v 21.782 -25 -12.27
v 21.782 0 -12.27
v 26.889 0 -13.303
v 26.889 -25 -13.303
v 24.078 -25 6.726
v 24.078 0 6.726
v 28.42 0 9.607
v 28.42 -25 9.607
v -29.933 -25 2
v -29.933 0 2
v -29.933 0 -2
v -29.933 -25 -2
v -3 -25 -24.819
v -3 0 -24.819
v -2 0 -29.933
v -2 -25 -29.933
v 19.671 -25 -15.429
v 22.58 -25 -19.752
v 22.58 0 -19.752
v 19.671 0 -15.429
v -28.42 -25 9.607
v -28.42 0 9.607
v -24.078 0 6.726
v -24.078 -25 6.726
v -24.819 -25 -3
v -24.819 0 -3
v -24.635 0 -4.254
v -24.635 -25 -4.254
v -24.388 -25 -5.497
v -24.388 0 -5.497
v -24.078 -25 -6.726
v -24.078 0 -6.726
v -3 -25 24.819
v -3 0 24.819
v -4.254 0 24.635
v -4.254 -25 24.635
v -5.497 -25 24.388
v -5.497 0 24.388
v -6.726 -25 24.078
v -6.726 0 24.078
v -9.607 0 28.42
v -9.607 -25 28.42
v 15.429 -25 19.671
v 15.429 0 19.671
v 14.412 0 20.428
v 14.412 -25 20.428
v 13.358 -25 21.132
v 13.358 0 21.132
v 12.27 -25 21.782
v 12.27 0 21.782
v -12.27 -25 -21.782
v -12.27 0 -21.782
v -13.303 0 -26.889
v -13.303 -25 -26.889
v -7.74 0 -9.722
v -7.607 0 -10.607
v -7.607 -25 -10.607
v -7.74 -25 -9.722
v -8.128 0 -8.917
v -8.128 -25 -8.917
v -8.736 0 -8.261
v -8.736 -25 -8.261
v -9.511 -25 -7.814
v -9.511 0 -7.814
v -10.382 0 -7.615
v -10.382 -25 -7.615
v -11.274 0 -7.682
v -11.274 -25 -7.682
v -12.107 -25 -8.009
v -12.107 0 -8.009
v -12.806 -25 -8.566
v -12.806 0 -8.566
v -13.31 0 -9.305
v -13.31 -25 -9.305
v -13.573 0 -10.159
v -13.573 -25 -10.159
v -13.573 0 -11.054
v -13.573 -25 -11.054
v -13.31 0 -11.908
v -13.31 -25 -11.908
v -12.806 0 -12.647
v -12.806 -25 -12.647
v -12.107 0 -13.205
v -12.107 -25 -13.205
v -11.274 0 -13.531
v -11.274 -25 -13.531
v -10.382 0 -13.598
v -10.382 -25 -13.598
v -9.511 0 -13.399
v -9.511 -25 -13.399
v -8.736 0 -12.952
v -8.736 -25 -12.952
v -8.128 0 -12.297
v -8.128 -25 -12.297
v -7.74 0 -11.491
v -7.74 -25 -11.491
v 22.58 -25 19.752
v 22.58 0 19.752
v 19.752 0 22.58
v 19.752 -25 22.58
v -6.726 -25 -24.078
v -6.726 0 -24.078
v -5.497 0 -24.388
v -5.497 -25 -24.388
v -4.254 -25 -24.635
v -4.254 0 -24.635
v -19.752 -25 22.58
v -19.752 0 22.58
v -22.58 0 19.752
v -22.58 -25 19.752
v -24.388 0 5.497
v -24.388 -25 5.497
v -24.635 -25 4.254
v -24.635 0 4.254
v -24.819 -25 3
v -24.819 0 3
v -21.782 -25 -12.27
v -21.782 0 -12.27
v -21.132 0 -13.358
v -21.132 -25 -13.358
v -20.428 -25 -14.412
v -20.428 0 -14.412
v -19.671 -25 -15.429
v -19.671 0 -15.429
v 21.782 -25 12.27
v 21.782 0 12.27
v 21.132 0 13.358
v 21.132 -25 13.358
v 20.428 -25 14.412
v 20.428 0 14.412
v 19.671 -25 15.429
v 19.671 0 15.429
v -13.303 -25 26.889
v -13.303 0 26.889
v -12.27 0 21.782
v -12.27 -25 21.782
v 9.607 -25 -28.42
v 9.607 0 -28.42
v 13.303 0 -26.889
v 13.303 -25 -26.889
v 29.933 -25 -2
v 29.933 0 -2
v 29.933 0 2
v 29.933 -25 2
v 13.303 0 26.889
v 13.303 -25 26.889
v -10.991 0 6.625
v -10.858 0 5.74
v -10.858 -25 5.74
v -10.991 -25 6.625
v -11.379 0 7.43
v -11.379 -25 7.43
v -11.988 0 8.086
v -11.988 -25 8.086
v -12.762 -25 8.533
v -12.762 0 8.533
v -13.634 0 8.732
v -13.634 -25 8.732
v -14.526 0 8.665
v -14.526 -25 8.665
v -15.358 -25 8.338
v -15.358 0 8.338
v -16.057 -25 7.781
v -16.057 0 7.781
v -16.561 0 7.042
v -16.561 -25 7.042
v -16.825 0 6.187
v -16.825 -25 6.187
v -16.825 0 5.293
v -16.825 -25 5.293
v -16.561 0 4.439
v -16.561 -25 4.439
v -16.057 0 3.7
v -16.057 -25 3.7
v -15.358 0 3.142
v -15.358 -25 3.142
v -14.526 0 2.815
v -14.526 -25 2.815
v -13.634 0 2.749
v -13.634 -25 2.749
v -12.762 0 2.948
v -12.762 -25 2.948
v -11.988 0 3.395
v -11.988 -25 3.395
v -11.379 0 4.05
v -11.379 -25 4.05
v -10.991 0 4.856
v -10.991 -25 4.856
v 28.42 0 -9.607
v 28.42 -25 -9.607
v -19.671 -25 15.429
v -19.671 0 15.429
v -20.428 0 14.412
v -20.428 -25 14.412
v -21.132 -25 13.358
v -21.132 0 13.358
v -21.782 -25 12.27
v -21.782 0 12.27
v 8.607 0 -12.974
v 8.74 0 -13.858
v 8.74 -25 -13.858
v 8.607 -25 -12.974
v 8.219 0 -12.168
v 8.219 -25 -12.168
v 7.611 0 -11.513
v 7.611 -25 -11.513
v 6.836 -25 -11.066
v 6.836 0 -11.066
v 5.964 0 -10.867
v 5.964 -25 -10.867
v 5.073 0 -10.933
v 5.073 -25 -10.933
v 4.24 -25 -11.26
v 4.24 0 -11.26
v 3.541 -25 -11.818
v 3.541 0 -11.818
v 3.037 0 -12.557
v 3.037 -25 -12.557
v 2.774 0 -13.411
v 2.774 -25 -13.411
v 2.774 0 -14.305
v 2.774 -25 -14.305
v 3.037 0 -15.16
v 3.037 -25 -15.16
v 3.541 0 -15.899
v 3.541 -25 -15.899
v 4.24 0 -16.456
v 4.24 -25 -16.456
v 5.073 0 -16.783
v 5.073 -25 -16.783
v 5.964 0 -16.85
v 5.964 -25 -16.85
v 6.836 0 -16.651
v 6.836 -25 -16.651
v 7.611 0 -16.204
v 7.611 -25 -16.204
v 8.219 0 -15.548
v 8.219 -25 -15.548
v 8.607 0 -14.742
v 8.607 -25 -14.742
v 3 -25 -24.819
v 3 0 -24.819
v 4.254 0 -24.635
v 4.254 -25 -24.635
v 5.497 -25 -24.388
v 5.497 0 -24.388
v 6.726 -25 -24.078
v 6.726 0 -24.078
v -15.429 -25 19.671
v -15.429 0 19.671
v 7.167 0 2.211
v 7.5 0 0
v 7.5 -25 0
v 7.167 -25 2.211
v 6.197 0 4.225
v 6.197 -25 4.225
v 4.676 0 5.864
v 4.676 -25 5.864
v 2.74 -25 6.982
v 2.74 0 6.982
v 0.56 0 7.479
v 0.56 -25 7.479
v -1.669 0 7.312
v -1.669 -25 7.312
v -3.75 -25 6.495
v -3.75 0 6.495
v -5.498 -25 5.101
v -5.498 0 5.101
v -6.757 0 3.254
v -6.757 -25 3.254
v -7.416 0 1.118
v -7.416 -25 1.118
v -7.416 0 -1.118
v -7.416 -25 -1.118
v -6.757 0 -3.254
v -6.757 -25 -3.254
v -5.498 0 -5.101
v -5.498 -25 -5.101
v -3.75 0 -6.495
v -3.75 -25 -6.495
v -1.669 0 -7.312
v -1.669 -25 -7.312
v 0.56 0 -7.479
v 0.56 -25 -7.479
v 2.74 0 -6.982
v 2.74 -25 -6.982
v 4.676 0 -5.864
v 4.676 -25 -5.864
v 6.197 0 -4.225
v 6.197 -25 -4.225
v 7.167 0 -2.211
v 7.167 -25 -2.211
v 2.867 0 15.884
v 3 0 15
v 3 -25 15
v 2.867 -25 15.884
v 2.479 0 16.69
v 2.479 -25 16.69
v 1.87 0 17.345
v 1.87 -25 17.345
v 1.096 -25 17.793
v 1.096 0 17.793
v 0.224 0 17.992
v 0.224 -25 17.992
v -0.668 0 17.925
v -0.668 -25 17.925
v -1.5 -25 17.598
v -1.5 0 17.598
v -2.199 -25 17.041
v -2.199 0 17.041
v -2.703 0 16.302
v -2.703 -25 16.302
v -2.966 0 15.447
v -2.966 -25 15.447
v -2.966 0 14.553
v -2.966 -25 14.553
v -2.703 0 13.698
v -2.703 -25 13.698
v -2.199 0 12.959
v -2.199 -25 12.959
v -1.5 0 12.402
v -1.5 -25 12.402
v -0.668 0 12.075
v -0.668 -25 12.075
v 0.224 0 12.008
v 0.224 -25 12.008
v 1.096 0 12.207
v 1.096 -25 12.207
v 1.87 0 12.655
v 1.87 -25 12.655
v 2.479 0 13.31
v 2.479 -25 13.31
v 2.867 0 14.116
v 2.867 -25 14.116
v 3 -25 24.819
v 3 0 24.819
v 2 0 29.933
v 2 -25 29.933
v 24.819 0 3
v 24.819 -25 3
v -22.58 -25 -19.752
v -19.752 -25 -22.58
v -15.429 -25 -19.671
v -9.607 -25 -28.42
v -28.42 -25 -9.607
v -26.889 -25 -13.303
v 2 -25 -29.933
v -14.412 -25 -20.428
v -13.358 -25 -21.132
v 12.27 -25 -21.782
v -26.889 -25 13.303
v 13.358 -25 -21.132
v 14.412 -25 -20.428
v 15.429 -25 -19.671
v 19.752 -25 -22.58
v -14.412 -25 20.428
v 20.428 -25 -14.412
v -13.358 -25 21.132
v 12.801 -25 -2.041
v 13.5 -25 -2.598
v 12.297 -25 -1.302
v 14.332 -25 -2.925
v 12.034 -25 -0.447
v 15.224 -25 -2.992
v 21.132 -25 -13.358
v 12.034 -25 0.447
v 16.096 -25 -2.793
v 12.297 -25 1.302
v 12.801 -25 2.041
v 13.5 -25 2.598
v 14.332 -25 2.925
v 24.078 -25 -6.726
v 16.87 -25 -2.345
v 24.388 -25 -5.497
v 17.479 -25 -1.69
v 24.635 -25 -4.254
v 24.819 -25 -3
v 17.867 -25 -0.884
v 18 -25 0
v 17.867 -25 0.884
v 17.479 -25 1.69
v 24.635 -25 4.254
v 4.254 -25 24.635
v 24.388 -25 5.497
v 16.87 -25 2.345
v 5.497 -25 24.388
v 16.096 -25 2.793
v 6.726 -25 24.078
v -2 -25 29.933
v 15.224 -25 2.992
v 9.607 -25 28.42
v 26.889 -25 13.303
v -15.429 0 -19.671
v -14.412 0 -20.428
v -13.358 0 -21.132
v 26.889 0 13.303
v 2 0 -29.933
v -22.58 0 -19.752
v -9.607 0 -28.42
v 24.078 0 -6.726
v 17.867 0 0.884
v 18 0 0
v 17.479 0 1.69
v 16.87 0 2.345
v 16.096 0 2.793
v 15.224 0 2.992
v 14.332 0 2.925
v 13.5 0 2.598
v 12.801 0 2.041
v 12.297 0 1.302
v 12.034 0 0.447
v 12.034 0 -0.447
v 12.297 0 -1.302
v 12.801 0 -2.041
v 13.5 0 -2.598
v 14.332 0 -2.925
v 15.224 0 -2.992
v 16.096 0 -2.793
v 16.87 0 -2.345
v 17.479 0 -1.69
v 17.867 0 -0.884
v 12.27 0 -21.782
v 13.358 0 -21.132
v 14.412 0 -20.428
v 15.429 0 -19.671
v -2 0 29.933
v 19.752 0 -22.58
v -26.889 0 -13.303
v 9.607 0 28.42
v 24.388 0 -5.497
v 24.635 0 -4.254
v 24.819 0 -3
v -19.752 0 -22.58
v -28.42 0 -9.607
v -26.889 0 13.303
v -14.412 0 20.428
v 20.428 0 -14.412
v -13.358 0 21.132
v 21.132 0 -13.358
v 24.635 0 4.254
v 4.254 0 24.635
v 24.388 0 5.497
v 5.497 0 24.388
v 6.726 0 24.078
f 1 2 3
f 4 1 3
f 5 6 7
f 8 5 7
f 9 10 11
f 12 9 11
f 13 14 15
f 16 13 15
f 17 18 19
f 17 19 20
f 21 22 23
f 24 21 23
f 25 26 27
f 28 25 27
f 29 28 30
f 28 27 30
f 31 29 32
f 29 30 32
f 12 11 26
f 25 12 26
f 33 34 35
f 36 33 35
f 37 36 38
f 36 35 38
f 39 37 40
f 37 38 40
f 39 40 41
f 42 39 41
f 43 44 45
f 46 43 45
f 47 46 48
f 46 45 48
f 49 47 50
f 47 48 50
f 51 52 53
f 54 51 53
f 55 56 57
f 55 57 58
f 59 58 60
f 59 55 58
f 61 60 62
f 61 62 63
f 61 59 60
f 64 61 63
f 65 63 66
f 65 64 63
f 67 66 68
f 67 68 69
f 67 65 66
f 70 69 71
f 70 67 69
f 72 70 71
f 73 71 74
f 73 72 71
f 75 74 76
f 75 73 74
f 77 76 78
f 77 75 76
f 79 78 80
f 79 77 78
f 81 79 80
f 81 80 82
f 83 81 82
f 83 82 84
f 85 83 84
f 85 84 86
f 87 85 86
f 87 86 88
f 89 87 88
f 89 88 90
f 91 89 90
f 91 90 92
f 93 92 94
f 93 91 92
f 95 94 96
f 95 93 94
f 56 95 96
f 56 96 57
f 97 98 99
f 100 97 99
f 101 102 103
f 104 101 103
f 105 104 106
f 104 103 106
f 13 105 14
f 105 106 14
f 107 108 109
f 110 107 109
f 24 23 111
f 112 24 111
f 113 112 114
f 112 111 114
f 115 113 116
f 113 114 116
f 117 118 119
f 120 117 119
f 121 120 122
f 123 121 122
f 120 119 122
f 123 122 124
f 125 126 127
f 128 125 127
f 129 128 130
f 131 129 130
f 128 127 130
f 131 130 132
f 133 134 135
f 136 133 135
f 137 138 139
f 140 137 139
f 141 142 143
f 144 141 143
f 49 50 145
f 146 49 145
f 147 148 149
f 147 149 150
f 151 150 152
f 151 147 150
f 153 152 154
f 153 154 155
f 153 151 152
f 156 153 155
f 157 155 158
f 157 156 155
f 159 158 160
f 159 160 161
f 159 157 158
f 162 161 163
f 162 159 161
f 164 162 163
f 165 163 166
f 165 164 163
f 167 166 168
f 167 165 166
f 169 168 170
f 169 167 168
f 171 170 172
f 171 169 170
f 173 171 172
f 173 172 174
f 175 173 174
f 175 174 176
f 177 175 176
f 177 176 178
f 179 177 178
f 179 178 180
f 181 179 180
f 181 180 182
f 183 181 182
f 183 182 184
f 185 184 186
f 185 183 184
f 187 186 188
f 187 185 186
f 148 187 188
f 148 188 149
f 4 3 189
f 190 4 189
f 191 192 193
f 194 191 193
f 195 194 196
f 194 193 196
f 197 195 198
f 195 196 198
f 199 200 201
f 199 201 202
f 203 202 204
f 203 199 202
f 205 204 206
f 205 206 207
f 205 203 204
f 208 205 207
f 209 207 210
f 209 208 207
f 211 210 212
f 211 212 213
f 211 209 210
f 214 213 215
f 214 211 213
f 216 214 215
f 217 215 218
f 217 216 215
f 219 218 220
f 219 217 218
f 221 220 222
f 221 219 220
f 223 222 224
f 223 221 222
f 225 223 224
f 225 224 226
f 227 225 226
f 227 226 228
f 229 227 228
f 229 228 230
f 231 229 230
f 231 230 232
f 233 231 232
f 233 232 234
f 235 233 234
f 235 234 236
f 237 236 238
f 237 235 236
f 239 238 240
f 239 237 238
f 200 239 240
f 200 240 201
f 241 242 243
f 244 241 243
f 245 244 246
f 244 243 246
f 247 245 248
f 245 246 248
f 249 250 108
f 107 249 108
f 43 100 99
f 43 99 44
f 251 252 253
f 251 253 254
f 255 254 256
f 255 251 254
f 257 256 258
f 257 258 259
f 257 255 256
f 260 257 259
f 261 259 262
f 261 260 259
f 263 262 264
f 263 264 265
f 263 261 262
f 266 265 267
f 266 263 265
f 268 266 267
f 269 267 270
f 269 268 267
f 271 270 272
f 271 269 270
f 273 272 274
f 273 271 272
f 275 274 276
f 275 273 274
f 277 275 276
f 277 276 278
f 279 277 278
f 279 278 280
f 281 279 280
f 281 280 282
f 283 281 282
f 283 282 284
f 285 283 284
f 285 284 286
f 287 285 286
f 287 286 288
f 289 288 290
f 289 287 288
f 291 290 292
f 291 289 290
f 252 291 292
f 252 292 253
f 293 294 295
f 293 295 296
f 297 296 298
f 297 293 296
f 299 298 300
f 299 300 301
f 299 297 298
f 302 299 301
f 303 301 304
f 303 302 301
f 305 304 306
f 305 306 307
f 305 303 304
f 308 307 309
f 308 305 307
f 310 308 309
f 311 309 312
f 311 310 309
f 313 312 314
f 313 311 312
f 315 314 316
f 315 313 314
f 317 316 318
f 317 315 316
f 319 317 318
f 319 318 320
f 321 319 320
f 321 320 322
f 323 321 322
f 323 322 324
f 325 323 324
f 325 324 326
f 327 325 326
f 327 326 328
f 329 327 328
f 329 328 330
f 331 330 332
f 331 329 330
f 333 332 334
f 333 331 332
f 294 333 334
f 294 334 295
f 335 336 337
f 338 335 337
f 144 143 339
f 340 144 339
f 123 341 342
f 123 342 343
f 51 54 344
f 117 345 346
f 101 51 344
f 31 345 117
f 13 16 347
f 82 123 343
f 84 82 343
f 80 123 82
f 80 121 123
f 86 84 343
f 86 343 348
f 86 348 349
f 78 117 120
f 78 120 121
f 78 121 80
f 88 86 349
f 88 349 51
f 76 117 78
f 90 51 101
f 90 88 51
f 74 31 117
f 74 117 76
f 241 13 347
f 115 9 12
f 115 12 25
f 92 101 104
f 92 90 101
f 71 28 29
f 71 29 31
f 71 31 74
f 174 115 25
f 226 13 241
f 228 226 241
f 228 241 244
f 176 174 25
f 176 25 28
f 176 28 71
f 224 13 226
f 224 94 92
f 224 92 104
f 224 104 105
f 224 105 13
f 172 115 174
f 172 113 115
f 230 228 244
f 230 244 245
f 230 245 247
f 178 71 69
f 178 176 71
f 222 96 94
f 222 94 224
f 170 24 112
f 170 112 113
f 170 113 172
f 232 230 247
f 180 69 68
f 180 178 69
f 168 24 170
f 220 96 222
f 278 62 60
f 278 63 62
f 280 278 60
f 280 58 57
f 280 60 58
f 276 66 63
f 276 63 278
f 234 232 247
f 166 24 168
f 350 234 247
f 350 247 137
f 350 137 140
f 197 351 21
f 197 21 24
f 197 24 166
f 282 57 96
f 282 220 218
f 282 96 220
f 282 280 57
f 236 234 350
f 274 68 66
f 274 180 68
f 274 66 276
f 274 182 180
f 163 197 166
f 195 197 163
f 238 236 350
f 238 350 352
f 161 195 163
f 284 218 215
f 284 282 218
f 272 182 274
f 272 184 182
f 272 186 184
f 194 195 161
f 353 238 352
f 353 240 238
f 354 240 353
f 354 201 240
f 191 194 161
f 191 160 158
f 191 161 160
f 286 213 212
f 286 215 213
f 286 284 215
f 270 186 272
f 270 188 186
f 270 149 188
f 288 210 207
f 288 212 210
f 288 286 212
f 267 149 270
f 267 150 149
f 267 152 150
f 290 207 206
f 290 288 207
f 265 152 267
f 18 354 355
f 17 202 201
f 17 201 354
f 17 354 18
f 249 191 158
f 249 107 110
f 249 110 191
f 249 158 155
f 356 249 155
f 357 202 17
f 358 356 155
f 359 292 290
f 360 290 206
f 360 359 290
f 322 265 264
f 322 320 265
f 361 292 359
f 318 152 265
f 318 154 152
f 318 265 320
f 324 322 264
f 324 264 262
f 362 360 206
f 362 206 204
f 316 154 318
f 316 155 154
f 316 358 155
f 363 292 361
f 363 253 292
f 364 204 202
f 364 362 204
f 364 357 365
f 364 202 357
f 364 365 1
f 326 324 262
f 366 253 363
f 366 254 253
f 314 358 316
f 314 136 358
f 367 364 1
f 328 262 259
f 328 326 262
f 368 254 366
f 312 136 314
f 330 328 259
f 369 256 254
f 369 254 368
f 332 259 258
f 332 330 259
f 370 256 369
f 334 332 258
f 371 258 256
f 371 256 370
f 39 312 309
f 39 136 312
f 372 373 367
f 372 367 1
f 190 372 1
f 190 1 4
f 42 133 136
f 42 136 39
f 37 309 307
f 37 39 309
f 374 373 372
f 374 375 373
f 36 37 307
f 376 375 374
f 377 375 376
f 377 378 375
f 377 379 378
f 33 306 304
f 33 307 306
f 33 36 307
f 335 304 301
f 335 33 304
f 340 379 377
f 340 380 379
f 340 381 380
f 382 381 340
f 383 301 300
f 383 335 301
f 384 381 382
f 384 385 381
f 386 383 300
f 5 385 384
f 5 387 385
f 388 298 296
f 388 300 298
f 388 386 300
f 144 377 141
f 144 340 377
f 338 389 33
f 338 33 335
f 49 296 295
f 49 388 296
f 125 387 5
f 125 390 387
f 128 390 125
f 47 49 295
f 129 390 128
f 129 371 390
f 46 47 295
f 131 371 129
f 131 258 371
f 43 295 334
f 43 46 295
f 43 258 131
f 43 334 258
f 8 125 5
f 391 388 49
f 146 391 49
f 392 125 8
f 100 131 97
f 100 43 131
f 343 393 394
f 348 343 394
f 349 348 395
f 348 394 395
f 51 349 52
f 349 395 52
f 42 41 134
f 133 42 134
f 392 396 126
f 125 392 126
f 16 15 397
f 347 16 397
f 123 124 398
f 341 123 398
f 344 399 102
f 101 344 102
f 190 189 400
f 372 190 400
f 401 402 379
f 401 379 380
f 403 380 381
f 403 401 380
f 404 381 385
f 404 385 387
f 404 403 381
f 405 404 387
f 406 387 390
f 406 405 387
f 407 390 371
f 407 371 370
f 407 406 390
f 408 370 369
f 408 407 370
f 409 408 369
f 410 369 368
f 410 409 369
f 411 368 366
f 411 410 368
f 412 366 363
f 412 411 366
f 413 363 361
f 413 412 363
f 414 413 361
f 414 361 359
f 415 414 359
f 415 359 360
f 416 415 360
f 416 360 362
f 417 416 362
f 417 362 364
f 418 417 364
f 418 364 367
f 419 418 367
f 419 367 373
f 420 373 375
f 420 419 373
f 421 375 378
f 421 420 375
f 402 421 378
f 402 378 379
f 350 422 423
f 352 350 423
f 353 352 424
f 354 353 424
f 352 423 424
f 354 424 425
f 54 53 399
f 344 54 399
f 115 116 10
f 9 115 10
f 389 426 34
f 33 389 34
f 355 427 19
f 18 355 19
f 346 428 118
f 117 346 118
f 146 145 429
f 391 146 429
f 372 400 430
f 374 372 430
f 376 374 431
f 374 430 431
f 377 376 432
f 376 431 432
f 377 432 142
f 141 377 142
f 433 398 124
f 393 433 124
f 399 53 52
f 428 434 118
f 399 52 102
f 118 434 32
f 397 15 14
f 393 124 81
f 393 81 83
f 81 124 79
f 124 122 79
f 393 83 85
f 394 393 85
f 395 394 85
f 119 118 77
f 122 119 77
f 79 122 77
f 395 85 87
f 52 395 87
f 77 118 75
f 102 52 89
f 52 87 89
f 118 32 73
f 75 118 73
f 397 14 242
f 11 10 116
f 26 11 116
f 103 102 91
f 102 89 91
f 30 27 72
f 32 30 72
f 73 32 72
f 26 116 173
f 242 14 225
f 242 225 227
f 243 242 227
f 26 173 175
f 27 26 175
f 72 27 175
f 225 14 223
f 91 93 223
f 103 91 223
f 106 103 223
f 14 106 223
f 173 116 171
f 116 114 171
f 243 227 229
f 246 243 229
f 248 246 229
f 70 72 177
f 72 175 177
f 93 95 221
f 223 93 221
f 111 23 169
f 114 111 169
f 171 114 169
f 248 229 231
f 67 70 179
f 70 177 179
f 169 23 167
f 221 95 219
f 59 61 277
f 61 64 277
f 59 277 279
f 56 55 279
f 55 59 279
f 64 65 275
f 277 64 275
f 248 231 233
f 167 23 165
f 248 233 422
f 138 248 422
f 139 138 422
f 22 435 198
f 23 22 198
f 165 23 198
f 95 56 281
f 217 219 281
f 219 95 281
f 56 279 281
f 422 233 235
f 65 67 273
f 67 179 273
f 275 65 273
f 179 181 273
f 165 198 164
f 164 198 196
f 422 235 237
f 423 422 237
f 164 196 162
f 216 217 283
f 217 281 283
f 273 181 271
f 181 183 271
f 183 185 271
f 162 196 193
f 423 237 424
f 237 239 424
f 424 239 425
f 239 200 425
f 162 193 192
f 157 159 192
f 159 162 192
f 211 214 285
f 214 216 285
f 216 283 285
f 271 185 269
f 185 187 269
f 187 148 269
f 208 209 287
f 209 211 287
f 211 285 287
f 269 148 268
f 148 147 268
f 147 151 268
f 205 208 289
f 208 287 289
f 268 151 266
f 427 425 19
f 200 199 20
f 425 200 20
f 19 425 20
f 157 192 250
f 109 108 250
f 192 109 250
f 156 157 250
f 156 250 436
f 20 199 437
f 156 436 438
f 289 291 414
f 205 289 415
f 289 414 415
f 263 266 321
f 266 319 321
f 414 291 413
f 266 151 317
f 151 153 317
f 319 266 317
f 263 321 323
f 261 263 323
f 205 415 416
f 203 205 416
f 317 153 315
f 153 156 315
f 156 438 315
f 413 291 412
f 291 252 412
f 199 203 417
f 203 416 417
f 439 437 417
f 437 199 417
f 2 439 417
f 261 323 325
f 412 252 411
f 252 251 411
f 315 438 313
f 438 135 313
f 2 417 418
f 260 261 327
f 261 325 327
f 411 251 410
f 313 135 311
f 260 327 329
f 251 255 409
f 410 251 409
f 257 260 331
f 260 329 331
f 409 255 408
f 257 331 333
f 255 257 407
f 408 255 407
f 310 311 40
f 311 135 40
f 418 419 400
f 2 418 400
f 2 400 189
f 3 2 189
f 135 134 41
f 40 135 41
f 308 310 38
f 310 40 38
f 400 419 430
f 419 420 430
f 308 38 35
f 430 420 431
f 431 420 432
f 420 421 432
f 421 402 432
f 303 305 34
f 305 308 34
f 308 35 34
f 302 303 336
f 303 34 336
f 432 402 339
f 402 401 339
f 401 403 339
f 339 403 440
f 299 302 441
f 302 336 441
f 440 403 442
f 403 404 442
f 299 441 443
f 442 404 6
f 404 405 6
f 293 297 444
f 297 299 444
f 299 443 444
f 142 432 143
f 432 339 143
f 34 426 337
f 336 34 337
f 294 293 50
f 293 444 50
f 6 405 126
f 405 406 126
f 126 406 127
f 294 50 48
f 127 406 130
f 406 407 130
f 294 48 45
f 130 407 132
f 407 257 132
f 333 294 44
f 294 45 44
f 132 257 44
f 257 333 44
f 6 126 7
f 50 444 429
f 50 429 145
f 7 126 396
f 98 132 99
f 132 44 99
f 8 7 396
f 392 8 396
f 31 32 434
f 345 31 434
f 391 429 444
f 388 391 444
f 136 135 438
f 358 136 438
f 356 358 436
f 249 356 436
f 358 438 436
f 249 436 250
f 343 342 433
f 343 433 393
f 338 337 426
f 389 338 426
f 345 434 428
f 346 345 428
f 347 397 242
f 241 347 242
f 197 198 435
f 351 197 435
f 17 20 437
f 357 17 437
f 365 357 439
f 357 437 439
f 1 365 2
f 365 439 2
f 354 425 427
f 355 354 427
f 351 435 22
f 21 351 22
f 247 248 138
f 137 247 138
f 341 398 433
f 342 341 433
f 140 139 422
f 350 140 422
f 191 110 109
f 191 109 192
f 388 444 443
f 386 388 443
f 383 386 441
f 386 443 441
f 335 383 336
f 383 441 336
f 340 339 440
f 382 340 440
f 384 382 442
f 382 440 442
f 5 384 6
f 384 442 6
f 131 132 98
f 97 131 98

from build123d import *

# Parameters (mm, degrees)
F0_R     = 3
F0_R_2   = 7.5
F1_DEPTH = 25


with BuildPart() as f1:
    # F0 (on Front) → F1 (new body)
    with BuildSketch(Plane.XZ):
        with BuildLine():
            ThreePointArc((24.819347, -3), (24.954796, -1.502717), (25, 0))
            ThreePointArc((25, 0), (24.954796, 1.502717), (24.819347, 3))
            ThreePointArc((24.819347, 3), (24.519632, 4.877258), (24.078137, 6.726314))
            ThreePointArc((24.078137, 6.726314), (23.096988, 9.567086), (21.782037, 12.269592))
            ThreePointArc((21.782037, 12.269592), (20.78674, 13.889256), (19.671249, 15.428608))
            ThreePointArc((19.671249, 15.428608), (17.67767, 17.67767), (15.428608, 19.671249))
            ThreePointArc((15.428608, 19.671249), (13.889256, 20.78674), (12.269592, 21.782037))
            ThreePointArc((12.269592, 21.782037), (9.567086, 23.096988), (6.726314, 24.078137))
            ThreePointArc((6.726314, 24.078137), (4.877258, 24.519632), (3, 24.819347))
            ThreePointArc((3, 24.819347), (0, 25), (-3, 24.819347))
            ThreePointArc((-3, 24.819347), (-4.877258, 24.519632), (-6.726314, 24.078137))
            ThreePointArc((-6.726314, 24.078137), (-9.567086, 23.096988), (-12.269592, 21.782037))
            ThreePointArc((-12.269592, 21.782037), (-13.889256, 20.78674), (-15.428608, 19.671249))
            ThreePointArc((-15.428608, 19.671249), (-17.67767, 17.67767), (-19.671249, 15.428608))
            ThreePointArc((-19.671249, 15.428608), (-20.78674, 13.889256), (-21.782037, 12.269592))
            ThreePointArc((-21.782037, 12.269592), (-23.096988, 9.567086), (-24.078137, 6.726314))
            ThreePointArc((-24.078137, 6.726314), (-24.519632, 4.877258), (-24.819347, 3))
            ThreePointArc((-24.819347, 3), (-25, 0), (-24.819347, -3))
            ThreePointArc((-24.819347, -3), (-24.519632, -4.877258), (-24.078137, -6.726314))
            ThreePointArc((-24.078137, -6.726314), (-23.096988, -9.567086), (-21.782037, -12.269592))
            ThreePointArc((-21.782037, -12.269592), (-20.78674, -13.889256), (-19.671249, -15.428608))
            ThreePointArc((-19.671249, -15.428608), (-17.67767, -17.67767), (-15.428608, -19.671249))
            ThreePointArc((-15.428608, -19.671249), (-13.889256, -20.78674), (-12.269592, -21.782037))
            ThreePointArc((-12.269592, -21.782037), (-9.567086, -23.096988), (-6.726314, -24.078137))
            ThreePointArc((-6.726314, -24.078137), (-4.877258, -24.519632), (-3, -24.819347))
            ThreePointArc((-3, -24.819347), (0, -25), (3, -24.819347))
            ThreePointArc((3, -24.819347), (4.877258, -24.519632), (6.726314, -24.078137))
            ThreePointArc((6.726314, -24.078137), (9.567086, -23.096988), (12.269592, -21.782037))
            ThreePointArc((12.269592, -21.782037), (13.889256, -20.78674), (15.428608, -19.671249))
            ThreePointArc((15.428608, -19.671249), (17.67767, -17.67767), (19.671249, -15.428608))
            ThreePointArc((19.671249, -15.428608), (20.78674, -13.889256), (21.782037, -12.269592))
            ThreePointArc((21.782037, -12.269592), (23.096988, -9.567086), (24.078137, -6.726314))
            ThreePointArc((24.078137, -6.726314), (24.519632, -4.877258), (24.819347, -3))
        make_face()
        with Locations((-10.606602, -10.606602)):
            Circle(F0_R, mode=Mode.SUBTRACT)
        with Locations((5.740251, -13.858193)):
            Circle(F0_R, mode=Mode.SUBTRACT)
        with Locations((-13.858193, 5.740251)):
            Circle(F0_R, mode=Mode.SUBTRACT)
        Circle(F0_R_2, mode=Mode.SUBTRACT)
        with Locations((15, 0)):
            Circle(F0_R, mode=Mode.SUBTRACT)
        with Locations((0, 15)):
            Circle(F0_R, mode=Mode.SUBTRACT)
        with BuildLine():
            ThreePointArc((24.819347, 3), (24.954796, 1.502717), (25, 0))
            ThreePointArc((25, 0), (24.954796, -1.502717), (24.819347, -3))
            Line((24.819347, -3), (29.933259, -2))
            Line((29.933259, -2), (29.933259, 2))
            Line((29.933259, 2), (24.819347, 3))
        make_face()
        with BuildLine():
            ThreePointArc((21.782037, 12.269592), (23.096988, 9.567086), (24.078137, 6.726314))
            Line((24.078137, 6.726314), (28.420092, 9.607203))
            Line((28.420092, 9.607203), (26.889359, 13.302721))
            Line((26.889359, 13.302721), (21.782037, 12.269592))
        make_face()
        with BuildLine():
            Line((28.420092, -9.607203), (24.078137, -6.726314))
            ThreePointArc((24.078137, -6.726314), (23.096988, -9.567086), (21.782037, -12.269592))
            Line((21.782037, -12.269592), (26.889359, -13.302721))
            Line((26.889359, -13.302721), (28.420092, -9.607203))
        make_face()
        with BuildLine():
            ThreePointArc((15.428608, 19.671249), (17.67767, 17.67767), (19.671249, 15.428608))
            Line((19.671249, 15.428608), (22.580224, 19.751797))
            Line((22.580224, 19.751797), (19.751797, 22.580224))
            Line((19.751797, 22.580224), (15.428608, 19.671249))
        make_face()
        with BuildLine():
            Line((22.580224, -19.751797), (19.671249, -15.428608))
            ThreePointArc((19.671249, -15.428608), (17.67767, -17.67767), (15.428608, -19.671249))
            Line((15.428608, -19.671249), (19.751797, -22.580224))
            Line((19.751797, -22.580224), (22.580224, -19.751797))
        make_face()
        with BuildLine():
            ThreePointArc((6.726314, 24.078137), (9.567086, 23.096988), (12.269592, 21.782037))
            Line((12.269592, 21.782037), (13.302721, 26.889359))
            Line((13.302721, 26.889359), (9.607203, 28.420092))
            Line((9.607203, 28.420092), (6.726314, 24.078137))
        make_face()
        with BuildLine():
            Line((13.302721, -26.889359), (12.269592, -21.782037))
            ThreePointArc((12.269592, -21.782037), (9.567086, -23.096988), (6.726314, -24.078137))
            Line((6.726314, -24.078137), (9.607203, -28.420092))
            Line((9.607203, -28.420092), (13.302721, -26.889359))
        make_face()
        with BuildLine():
            ThreePointArc((-3, 24.819347), (0, 25), (3, 24.819347))
            Line((3, 24.819347), (2, 29.933259))
            Line((2, 29.933259), (-2, 29.933259))
            Line((-2, 29.933259), (-3, 24.819347))
        make_face()
        with BuildLine():
            Line((2, -29.933259), (3, -24.819347))
            ThreePointArc((3, -24.819347), (0, -25), (-3, -24.819347))
            Line((-3, -24.819347), (-2, -29.933259))
            Line((-2, -29.933259), (2, -29.933259))
        make_face()
        with BuildLine():
            ThreePointArc((-12.269592, 21.782037), (-9.567086, 23.096988), (-6.726314, 24.078137))
            Line((-6.726314, 24.078137), (-9.607203, 28.420092))
            Line((-9.607203, 28.420092), (-13.302721, 26.889359))
            Line((-13.302721, 26.889359), (-12.269592, 21.782037))
        make_face()
        with BuildLine():
            Line((-9.607203, -28.420092), (-6.726314, -24.078137))
            ThreePointArc((-6.726314, -24.078137), (-9.567086, -23.096988), (-12.269592, -21.782037))
            Line((-12.269592, -21.782037), (-13.302721, -26.889359))
            Line((-13.302721, -26.889359), (-9.607203, -28.420092))
        make_face()
        with BuildLine():
            ThreePointArc((-19.671249, 15.428608), (-17.67767, 17.67767), (-15.428608, 19.671249))
            Line((-15.428608, 19.671249), (-19.751797, 22.580224))
            Line((-19.751797, 22.580224), (-22.580224, 19.751797))
            Line((-22.580224, 19.751797), (-19.671249, 15.428608))
        make_face()
        with BuildLine():
            Line((-19.751797, -22.580224), (-15.428608, -19.671249))
            ThreePointArc((-15.428608, -19.671249), (-17.67767, -17.67767), (-19.671249, -15.428608))
            Line((-19.671249, -15.428608), (-22.580224, -19.751797))
            Line((-22.580224, -19.751797), (-19.751797, -22.580224))
        make_face()
        with BuildLine():
            ThreePointArc((-24.078137, 6.726314), (-23.096988, 9.567086), (-21.782037, 12.269592))
            Line((-21.782037, 12.269592), (-26.889359, 13.302721))
            Line((-26.889359, 13.302721), (-28.420092, 9.607203))
            Line((-28.420092, 9.607203), (-24.078137, 6.726314))
        make_face()
        with BuildLine():
            Line((-26.889359, -13.302721), (-21.782037, -12.269592))
            ThreePointArc((-21.782037, -12.269592), (-23.096988, -9.567086), (-24.078137, -6.726314))
            Line((-24.078137, -6.726314), (-28.420092, -9.607203))
            Line((-28.420092, -9.607203), (-26.889359, -13.302721))
        make_face()
        with BuildLine():
            ThreePointArc((-24.819347, -3), (-25, 0), (-24.819347, 3))
            Line((-24.819347, 3), (-29.933259, 2))
            Line((-29.933259, 2), (-29.933259, -2))
            Line((-29.933259, -2), (-24.819347, -3))
        make_face()
    extrude(amount=F1_DEPTH)


solid = f1.part
